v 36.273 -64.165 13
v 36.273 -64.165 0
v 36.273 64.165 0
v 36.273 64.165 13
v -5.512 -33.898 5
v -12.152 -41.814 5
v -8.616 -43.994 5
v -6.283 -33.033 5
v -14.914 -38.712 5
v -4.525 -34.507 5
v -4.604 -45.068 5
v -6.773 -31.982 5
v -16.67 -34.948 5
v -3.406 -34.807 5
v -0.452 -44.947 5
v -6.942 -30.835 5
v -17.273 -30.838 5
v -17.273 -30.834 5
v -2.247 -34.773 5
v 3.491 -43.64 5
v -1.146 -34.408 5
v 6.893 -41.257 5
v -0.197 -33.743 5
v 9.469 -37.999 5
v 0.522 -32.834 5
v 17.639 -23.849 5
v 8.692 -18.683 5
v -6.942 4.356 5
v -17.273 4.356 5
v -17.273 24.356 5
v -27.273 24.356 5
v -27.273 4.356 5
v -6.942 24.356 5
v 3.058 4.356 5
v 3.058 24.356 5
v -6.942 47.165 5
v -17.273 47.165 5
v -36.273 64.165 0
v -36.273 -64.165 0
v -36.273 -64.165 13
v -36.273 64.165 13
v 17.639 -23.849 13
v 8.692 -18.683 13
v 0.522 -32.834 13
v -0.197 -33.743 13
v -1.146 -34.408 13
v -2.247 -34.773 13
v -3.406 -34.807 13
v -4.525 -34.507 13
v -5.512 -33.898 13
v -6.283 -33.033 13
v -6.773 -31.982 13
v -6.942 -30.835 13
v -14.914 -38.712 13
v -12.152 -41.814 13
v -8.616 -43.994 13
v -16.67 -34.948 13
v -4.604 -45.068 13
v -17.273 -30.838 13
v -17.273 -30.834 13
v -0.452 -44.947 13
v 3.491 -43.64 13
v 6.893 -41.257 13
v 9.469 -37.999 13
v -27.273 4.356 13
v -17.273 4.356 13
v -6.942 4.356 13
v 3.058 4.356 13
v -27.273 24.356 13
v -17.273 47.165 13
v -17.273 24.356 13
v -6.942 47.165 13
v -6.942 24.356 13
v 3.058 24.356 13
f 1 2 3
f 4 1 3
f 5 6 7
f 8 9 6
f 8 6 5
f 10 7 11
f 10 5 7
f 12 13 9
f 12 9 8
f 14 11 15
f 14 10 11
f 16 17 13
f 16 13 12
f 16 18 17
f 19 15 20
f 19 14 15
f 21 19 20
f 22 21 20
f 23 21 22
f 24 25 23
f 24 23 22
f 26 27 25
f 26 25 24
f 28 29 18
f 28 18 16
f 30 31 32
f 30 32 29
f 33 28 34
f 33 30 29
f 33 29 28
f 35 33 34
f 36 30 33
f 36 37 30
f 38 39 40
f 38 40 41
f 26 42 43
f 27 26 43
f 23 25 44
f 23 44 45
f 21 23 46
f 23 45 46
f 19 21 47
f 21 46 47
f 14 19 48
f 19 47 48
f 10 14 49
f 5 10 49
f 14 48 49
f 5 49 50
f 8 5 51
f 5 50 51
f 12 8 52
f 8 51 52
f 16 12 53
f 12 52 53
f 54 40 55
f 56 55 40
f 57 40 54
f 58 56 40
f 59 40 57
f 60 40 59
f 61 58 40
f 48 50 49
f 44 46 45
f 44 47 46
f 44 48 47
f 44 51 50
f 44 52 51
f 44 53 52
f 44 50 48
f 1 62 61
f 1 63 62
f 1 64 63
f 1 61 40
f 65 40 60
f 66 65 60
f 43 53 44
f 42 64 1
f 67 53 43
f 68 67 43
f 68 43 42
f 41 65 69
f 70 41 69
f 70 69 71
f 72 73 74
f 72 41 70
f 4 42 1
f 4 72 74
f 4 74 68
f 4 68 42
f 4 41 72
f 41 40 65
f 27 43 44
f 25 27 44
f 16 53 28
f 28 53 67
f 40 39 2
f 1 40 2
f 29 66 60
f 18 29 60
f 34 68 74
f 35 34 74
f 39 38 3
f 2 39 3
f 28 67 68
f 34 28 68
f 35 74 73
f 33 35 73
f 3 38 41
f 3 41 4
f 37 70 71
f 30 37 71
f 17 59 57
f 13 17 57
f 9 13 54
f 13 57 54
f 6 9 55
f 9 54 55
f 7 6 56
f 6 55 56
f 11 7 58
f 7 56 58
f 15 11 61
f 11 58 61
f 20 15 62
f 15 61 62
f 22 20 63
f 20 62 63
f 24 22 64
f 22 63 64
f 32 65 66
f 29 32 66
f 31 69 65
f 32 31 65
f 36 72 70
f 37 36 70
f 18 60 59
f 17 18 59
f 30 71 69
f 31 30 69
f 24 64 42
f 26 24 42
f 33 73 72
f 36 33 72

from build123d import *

# Parameters (mm, degrees)
F0_W     = 72.546231
F0_H     = 128.329664
F1_DEPTH = 13
F3_DEPTH = 8


# Not quite as in the source:
# - ends of sketch curves that miss each other by under 0.0002 mm in the source are joined


with BuildPart() as f1:
    # F0 (on Top) → F1 (new body)
    with BuildSketch(Plane.XY):
        with Locations((5e-07, 0)):
            Rectangle(F0_W, F0_H)
    extrude(amount=F1_DEPTH)

    # F2 (on face) → F3 (cut)
    with BuildSketch(Plane.XY.offset(13)):
        with BuildLine():
            Line((-6.941915, 24.355961), (-6.941915, 47.164832))
            Line((-6.941915, 47.164832), (-17.273115, 47.164832))
            Line((-17.273115, 47.164832), (-17.273115, 24.355961))
            Line((-17.273115, 24.355961), (-27.273115, 24.355961))
            Line((-27.273115, 24.355961), (-27.273115, 4.355961))
            Line((-27.273115, 4.355961), (-17.273115, 4.355961))
            Line((-17.273115, 4.355961), (-17.2731146267, -30.8336322155))
            Line((-17.2731146267, -30.8336322155), (-17.2731146267, -30.8377282155))
            Line((-17.2731146267, -30.8377282155), (-17.2731139504, -30.8380352155))
            ThreePointArc((-17.2731139504, -30.8380352155), (-6.6489757762, -44.6770778186), (9.4692682, -37.9992321155))
            Line((9.4692682, -37.9992321155), (17.6391412, -23.8485971155))
            Line((17.6391412, -23.8485971155), (8.69206, -18.682997))
            Line((8.69206, -18.682997), (0.522187, -32.833632))
            ThreePointArc((0.522187, -32.833632), (-3.9764490293, -34.6975341769), (-6.9419144165, -30.8351679998))
            Line((-6.9419144165, -30.8351679998), (-6.94191496, -30.8348611666))
            Line((-6.94191496, -30.8348611666), (-6.94191496, -30.8336322155))
            Line((-6.94191496, -30.8336322155), (-6.94191496, 4.355961))
            Line((-6.94191496, 4.355961), (3.058085, 4.355961))
            Line((3.058085, 4.355961), (3.05808504, 24.355961))
            Line((3.05808504, 24.355961), (-6.941915, 24.355961))
        make_face()
    extrude(amount=-F3_DEPTH, mode=Mode.SUBTRACT)


solid = f1.part
